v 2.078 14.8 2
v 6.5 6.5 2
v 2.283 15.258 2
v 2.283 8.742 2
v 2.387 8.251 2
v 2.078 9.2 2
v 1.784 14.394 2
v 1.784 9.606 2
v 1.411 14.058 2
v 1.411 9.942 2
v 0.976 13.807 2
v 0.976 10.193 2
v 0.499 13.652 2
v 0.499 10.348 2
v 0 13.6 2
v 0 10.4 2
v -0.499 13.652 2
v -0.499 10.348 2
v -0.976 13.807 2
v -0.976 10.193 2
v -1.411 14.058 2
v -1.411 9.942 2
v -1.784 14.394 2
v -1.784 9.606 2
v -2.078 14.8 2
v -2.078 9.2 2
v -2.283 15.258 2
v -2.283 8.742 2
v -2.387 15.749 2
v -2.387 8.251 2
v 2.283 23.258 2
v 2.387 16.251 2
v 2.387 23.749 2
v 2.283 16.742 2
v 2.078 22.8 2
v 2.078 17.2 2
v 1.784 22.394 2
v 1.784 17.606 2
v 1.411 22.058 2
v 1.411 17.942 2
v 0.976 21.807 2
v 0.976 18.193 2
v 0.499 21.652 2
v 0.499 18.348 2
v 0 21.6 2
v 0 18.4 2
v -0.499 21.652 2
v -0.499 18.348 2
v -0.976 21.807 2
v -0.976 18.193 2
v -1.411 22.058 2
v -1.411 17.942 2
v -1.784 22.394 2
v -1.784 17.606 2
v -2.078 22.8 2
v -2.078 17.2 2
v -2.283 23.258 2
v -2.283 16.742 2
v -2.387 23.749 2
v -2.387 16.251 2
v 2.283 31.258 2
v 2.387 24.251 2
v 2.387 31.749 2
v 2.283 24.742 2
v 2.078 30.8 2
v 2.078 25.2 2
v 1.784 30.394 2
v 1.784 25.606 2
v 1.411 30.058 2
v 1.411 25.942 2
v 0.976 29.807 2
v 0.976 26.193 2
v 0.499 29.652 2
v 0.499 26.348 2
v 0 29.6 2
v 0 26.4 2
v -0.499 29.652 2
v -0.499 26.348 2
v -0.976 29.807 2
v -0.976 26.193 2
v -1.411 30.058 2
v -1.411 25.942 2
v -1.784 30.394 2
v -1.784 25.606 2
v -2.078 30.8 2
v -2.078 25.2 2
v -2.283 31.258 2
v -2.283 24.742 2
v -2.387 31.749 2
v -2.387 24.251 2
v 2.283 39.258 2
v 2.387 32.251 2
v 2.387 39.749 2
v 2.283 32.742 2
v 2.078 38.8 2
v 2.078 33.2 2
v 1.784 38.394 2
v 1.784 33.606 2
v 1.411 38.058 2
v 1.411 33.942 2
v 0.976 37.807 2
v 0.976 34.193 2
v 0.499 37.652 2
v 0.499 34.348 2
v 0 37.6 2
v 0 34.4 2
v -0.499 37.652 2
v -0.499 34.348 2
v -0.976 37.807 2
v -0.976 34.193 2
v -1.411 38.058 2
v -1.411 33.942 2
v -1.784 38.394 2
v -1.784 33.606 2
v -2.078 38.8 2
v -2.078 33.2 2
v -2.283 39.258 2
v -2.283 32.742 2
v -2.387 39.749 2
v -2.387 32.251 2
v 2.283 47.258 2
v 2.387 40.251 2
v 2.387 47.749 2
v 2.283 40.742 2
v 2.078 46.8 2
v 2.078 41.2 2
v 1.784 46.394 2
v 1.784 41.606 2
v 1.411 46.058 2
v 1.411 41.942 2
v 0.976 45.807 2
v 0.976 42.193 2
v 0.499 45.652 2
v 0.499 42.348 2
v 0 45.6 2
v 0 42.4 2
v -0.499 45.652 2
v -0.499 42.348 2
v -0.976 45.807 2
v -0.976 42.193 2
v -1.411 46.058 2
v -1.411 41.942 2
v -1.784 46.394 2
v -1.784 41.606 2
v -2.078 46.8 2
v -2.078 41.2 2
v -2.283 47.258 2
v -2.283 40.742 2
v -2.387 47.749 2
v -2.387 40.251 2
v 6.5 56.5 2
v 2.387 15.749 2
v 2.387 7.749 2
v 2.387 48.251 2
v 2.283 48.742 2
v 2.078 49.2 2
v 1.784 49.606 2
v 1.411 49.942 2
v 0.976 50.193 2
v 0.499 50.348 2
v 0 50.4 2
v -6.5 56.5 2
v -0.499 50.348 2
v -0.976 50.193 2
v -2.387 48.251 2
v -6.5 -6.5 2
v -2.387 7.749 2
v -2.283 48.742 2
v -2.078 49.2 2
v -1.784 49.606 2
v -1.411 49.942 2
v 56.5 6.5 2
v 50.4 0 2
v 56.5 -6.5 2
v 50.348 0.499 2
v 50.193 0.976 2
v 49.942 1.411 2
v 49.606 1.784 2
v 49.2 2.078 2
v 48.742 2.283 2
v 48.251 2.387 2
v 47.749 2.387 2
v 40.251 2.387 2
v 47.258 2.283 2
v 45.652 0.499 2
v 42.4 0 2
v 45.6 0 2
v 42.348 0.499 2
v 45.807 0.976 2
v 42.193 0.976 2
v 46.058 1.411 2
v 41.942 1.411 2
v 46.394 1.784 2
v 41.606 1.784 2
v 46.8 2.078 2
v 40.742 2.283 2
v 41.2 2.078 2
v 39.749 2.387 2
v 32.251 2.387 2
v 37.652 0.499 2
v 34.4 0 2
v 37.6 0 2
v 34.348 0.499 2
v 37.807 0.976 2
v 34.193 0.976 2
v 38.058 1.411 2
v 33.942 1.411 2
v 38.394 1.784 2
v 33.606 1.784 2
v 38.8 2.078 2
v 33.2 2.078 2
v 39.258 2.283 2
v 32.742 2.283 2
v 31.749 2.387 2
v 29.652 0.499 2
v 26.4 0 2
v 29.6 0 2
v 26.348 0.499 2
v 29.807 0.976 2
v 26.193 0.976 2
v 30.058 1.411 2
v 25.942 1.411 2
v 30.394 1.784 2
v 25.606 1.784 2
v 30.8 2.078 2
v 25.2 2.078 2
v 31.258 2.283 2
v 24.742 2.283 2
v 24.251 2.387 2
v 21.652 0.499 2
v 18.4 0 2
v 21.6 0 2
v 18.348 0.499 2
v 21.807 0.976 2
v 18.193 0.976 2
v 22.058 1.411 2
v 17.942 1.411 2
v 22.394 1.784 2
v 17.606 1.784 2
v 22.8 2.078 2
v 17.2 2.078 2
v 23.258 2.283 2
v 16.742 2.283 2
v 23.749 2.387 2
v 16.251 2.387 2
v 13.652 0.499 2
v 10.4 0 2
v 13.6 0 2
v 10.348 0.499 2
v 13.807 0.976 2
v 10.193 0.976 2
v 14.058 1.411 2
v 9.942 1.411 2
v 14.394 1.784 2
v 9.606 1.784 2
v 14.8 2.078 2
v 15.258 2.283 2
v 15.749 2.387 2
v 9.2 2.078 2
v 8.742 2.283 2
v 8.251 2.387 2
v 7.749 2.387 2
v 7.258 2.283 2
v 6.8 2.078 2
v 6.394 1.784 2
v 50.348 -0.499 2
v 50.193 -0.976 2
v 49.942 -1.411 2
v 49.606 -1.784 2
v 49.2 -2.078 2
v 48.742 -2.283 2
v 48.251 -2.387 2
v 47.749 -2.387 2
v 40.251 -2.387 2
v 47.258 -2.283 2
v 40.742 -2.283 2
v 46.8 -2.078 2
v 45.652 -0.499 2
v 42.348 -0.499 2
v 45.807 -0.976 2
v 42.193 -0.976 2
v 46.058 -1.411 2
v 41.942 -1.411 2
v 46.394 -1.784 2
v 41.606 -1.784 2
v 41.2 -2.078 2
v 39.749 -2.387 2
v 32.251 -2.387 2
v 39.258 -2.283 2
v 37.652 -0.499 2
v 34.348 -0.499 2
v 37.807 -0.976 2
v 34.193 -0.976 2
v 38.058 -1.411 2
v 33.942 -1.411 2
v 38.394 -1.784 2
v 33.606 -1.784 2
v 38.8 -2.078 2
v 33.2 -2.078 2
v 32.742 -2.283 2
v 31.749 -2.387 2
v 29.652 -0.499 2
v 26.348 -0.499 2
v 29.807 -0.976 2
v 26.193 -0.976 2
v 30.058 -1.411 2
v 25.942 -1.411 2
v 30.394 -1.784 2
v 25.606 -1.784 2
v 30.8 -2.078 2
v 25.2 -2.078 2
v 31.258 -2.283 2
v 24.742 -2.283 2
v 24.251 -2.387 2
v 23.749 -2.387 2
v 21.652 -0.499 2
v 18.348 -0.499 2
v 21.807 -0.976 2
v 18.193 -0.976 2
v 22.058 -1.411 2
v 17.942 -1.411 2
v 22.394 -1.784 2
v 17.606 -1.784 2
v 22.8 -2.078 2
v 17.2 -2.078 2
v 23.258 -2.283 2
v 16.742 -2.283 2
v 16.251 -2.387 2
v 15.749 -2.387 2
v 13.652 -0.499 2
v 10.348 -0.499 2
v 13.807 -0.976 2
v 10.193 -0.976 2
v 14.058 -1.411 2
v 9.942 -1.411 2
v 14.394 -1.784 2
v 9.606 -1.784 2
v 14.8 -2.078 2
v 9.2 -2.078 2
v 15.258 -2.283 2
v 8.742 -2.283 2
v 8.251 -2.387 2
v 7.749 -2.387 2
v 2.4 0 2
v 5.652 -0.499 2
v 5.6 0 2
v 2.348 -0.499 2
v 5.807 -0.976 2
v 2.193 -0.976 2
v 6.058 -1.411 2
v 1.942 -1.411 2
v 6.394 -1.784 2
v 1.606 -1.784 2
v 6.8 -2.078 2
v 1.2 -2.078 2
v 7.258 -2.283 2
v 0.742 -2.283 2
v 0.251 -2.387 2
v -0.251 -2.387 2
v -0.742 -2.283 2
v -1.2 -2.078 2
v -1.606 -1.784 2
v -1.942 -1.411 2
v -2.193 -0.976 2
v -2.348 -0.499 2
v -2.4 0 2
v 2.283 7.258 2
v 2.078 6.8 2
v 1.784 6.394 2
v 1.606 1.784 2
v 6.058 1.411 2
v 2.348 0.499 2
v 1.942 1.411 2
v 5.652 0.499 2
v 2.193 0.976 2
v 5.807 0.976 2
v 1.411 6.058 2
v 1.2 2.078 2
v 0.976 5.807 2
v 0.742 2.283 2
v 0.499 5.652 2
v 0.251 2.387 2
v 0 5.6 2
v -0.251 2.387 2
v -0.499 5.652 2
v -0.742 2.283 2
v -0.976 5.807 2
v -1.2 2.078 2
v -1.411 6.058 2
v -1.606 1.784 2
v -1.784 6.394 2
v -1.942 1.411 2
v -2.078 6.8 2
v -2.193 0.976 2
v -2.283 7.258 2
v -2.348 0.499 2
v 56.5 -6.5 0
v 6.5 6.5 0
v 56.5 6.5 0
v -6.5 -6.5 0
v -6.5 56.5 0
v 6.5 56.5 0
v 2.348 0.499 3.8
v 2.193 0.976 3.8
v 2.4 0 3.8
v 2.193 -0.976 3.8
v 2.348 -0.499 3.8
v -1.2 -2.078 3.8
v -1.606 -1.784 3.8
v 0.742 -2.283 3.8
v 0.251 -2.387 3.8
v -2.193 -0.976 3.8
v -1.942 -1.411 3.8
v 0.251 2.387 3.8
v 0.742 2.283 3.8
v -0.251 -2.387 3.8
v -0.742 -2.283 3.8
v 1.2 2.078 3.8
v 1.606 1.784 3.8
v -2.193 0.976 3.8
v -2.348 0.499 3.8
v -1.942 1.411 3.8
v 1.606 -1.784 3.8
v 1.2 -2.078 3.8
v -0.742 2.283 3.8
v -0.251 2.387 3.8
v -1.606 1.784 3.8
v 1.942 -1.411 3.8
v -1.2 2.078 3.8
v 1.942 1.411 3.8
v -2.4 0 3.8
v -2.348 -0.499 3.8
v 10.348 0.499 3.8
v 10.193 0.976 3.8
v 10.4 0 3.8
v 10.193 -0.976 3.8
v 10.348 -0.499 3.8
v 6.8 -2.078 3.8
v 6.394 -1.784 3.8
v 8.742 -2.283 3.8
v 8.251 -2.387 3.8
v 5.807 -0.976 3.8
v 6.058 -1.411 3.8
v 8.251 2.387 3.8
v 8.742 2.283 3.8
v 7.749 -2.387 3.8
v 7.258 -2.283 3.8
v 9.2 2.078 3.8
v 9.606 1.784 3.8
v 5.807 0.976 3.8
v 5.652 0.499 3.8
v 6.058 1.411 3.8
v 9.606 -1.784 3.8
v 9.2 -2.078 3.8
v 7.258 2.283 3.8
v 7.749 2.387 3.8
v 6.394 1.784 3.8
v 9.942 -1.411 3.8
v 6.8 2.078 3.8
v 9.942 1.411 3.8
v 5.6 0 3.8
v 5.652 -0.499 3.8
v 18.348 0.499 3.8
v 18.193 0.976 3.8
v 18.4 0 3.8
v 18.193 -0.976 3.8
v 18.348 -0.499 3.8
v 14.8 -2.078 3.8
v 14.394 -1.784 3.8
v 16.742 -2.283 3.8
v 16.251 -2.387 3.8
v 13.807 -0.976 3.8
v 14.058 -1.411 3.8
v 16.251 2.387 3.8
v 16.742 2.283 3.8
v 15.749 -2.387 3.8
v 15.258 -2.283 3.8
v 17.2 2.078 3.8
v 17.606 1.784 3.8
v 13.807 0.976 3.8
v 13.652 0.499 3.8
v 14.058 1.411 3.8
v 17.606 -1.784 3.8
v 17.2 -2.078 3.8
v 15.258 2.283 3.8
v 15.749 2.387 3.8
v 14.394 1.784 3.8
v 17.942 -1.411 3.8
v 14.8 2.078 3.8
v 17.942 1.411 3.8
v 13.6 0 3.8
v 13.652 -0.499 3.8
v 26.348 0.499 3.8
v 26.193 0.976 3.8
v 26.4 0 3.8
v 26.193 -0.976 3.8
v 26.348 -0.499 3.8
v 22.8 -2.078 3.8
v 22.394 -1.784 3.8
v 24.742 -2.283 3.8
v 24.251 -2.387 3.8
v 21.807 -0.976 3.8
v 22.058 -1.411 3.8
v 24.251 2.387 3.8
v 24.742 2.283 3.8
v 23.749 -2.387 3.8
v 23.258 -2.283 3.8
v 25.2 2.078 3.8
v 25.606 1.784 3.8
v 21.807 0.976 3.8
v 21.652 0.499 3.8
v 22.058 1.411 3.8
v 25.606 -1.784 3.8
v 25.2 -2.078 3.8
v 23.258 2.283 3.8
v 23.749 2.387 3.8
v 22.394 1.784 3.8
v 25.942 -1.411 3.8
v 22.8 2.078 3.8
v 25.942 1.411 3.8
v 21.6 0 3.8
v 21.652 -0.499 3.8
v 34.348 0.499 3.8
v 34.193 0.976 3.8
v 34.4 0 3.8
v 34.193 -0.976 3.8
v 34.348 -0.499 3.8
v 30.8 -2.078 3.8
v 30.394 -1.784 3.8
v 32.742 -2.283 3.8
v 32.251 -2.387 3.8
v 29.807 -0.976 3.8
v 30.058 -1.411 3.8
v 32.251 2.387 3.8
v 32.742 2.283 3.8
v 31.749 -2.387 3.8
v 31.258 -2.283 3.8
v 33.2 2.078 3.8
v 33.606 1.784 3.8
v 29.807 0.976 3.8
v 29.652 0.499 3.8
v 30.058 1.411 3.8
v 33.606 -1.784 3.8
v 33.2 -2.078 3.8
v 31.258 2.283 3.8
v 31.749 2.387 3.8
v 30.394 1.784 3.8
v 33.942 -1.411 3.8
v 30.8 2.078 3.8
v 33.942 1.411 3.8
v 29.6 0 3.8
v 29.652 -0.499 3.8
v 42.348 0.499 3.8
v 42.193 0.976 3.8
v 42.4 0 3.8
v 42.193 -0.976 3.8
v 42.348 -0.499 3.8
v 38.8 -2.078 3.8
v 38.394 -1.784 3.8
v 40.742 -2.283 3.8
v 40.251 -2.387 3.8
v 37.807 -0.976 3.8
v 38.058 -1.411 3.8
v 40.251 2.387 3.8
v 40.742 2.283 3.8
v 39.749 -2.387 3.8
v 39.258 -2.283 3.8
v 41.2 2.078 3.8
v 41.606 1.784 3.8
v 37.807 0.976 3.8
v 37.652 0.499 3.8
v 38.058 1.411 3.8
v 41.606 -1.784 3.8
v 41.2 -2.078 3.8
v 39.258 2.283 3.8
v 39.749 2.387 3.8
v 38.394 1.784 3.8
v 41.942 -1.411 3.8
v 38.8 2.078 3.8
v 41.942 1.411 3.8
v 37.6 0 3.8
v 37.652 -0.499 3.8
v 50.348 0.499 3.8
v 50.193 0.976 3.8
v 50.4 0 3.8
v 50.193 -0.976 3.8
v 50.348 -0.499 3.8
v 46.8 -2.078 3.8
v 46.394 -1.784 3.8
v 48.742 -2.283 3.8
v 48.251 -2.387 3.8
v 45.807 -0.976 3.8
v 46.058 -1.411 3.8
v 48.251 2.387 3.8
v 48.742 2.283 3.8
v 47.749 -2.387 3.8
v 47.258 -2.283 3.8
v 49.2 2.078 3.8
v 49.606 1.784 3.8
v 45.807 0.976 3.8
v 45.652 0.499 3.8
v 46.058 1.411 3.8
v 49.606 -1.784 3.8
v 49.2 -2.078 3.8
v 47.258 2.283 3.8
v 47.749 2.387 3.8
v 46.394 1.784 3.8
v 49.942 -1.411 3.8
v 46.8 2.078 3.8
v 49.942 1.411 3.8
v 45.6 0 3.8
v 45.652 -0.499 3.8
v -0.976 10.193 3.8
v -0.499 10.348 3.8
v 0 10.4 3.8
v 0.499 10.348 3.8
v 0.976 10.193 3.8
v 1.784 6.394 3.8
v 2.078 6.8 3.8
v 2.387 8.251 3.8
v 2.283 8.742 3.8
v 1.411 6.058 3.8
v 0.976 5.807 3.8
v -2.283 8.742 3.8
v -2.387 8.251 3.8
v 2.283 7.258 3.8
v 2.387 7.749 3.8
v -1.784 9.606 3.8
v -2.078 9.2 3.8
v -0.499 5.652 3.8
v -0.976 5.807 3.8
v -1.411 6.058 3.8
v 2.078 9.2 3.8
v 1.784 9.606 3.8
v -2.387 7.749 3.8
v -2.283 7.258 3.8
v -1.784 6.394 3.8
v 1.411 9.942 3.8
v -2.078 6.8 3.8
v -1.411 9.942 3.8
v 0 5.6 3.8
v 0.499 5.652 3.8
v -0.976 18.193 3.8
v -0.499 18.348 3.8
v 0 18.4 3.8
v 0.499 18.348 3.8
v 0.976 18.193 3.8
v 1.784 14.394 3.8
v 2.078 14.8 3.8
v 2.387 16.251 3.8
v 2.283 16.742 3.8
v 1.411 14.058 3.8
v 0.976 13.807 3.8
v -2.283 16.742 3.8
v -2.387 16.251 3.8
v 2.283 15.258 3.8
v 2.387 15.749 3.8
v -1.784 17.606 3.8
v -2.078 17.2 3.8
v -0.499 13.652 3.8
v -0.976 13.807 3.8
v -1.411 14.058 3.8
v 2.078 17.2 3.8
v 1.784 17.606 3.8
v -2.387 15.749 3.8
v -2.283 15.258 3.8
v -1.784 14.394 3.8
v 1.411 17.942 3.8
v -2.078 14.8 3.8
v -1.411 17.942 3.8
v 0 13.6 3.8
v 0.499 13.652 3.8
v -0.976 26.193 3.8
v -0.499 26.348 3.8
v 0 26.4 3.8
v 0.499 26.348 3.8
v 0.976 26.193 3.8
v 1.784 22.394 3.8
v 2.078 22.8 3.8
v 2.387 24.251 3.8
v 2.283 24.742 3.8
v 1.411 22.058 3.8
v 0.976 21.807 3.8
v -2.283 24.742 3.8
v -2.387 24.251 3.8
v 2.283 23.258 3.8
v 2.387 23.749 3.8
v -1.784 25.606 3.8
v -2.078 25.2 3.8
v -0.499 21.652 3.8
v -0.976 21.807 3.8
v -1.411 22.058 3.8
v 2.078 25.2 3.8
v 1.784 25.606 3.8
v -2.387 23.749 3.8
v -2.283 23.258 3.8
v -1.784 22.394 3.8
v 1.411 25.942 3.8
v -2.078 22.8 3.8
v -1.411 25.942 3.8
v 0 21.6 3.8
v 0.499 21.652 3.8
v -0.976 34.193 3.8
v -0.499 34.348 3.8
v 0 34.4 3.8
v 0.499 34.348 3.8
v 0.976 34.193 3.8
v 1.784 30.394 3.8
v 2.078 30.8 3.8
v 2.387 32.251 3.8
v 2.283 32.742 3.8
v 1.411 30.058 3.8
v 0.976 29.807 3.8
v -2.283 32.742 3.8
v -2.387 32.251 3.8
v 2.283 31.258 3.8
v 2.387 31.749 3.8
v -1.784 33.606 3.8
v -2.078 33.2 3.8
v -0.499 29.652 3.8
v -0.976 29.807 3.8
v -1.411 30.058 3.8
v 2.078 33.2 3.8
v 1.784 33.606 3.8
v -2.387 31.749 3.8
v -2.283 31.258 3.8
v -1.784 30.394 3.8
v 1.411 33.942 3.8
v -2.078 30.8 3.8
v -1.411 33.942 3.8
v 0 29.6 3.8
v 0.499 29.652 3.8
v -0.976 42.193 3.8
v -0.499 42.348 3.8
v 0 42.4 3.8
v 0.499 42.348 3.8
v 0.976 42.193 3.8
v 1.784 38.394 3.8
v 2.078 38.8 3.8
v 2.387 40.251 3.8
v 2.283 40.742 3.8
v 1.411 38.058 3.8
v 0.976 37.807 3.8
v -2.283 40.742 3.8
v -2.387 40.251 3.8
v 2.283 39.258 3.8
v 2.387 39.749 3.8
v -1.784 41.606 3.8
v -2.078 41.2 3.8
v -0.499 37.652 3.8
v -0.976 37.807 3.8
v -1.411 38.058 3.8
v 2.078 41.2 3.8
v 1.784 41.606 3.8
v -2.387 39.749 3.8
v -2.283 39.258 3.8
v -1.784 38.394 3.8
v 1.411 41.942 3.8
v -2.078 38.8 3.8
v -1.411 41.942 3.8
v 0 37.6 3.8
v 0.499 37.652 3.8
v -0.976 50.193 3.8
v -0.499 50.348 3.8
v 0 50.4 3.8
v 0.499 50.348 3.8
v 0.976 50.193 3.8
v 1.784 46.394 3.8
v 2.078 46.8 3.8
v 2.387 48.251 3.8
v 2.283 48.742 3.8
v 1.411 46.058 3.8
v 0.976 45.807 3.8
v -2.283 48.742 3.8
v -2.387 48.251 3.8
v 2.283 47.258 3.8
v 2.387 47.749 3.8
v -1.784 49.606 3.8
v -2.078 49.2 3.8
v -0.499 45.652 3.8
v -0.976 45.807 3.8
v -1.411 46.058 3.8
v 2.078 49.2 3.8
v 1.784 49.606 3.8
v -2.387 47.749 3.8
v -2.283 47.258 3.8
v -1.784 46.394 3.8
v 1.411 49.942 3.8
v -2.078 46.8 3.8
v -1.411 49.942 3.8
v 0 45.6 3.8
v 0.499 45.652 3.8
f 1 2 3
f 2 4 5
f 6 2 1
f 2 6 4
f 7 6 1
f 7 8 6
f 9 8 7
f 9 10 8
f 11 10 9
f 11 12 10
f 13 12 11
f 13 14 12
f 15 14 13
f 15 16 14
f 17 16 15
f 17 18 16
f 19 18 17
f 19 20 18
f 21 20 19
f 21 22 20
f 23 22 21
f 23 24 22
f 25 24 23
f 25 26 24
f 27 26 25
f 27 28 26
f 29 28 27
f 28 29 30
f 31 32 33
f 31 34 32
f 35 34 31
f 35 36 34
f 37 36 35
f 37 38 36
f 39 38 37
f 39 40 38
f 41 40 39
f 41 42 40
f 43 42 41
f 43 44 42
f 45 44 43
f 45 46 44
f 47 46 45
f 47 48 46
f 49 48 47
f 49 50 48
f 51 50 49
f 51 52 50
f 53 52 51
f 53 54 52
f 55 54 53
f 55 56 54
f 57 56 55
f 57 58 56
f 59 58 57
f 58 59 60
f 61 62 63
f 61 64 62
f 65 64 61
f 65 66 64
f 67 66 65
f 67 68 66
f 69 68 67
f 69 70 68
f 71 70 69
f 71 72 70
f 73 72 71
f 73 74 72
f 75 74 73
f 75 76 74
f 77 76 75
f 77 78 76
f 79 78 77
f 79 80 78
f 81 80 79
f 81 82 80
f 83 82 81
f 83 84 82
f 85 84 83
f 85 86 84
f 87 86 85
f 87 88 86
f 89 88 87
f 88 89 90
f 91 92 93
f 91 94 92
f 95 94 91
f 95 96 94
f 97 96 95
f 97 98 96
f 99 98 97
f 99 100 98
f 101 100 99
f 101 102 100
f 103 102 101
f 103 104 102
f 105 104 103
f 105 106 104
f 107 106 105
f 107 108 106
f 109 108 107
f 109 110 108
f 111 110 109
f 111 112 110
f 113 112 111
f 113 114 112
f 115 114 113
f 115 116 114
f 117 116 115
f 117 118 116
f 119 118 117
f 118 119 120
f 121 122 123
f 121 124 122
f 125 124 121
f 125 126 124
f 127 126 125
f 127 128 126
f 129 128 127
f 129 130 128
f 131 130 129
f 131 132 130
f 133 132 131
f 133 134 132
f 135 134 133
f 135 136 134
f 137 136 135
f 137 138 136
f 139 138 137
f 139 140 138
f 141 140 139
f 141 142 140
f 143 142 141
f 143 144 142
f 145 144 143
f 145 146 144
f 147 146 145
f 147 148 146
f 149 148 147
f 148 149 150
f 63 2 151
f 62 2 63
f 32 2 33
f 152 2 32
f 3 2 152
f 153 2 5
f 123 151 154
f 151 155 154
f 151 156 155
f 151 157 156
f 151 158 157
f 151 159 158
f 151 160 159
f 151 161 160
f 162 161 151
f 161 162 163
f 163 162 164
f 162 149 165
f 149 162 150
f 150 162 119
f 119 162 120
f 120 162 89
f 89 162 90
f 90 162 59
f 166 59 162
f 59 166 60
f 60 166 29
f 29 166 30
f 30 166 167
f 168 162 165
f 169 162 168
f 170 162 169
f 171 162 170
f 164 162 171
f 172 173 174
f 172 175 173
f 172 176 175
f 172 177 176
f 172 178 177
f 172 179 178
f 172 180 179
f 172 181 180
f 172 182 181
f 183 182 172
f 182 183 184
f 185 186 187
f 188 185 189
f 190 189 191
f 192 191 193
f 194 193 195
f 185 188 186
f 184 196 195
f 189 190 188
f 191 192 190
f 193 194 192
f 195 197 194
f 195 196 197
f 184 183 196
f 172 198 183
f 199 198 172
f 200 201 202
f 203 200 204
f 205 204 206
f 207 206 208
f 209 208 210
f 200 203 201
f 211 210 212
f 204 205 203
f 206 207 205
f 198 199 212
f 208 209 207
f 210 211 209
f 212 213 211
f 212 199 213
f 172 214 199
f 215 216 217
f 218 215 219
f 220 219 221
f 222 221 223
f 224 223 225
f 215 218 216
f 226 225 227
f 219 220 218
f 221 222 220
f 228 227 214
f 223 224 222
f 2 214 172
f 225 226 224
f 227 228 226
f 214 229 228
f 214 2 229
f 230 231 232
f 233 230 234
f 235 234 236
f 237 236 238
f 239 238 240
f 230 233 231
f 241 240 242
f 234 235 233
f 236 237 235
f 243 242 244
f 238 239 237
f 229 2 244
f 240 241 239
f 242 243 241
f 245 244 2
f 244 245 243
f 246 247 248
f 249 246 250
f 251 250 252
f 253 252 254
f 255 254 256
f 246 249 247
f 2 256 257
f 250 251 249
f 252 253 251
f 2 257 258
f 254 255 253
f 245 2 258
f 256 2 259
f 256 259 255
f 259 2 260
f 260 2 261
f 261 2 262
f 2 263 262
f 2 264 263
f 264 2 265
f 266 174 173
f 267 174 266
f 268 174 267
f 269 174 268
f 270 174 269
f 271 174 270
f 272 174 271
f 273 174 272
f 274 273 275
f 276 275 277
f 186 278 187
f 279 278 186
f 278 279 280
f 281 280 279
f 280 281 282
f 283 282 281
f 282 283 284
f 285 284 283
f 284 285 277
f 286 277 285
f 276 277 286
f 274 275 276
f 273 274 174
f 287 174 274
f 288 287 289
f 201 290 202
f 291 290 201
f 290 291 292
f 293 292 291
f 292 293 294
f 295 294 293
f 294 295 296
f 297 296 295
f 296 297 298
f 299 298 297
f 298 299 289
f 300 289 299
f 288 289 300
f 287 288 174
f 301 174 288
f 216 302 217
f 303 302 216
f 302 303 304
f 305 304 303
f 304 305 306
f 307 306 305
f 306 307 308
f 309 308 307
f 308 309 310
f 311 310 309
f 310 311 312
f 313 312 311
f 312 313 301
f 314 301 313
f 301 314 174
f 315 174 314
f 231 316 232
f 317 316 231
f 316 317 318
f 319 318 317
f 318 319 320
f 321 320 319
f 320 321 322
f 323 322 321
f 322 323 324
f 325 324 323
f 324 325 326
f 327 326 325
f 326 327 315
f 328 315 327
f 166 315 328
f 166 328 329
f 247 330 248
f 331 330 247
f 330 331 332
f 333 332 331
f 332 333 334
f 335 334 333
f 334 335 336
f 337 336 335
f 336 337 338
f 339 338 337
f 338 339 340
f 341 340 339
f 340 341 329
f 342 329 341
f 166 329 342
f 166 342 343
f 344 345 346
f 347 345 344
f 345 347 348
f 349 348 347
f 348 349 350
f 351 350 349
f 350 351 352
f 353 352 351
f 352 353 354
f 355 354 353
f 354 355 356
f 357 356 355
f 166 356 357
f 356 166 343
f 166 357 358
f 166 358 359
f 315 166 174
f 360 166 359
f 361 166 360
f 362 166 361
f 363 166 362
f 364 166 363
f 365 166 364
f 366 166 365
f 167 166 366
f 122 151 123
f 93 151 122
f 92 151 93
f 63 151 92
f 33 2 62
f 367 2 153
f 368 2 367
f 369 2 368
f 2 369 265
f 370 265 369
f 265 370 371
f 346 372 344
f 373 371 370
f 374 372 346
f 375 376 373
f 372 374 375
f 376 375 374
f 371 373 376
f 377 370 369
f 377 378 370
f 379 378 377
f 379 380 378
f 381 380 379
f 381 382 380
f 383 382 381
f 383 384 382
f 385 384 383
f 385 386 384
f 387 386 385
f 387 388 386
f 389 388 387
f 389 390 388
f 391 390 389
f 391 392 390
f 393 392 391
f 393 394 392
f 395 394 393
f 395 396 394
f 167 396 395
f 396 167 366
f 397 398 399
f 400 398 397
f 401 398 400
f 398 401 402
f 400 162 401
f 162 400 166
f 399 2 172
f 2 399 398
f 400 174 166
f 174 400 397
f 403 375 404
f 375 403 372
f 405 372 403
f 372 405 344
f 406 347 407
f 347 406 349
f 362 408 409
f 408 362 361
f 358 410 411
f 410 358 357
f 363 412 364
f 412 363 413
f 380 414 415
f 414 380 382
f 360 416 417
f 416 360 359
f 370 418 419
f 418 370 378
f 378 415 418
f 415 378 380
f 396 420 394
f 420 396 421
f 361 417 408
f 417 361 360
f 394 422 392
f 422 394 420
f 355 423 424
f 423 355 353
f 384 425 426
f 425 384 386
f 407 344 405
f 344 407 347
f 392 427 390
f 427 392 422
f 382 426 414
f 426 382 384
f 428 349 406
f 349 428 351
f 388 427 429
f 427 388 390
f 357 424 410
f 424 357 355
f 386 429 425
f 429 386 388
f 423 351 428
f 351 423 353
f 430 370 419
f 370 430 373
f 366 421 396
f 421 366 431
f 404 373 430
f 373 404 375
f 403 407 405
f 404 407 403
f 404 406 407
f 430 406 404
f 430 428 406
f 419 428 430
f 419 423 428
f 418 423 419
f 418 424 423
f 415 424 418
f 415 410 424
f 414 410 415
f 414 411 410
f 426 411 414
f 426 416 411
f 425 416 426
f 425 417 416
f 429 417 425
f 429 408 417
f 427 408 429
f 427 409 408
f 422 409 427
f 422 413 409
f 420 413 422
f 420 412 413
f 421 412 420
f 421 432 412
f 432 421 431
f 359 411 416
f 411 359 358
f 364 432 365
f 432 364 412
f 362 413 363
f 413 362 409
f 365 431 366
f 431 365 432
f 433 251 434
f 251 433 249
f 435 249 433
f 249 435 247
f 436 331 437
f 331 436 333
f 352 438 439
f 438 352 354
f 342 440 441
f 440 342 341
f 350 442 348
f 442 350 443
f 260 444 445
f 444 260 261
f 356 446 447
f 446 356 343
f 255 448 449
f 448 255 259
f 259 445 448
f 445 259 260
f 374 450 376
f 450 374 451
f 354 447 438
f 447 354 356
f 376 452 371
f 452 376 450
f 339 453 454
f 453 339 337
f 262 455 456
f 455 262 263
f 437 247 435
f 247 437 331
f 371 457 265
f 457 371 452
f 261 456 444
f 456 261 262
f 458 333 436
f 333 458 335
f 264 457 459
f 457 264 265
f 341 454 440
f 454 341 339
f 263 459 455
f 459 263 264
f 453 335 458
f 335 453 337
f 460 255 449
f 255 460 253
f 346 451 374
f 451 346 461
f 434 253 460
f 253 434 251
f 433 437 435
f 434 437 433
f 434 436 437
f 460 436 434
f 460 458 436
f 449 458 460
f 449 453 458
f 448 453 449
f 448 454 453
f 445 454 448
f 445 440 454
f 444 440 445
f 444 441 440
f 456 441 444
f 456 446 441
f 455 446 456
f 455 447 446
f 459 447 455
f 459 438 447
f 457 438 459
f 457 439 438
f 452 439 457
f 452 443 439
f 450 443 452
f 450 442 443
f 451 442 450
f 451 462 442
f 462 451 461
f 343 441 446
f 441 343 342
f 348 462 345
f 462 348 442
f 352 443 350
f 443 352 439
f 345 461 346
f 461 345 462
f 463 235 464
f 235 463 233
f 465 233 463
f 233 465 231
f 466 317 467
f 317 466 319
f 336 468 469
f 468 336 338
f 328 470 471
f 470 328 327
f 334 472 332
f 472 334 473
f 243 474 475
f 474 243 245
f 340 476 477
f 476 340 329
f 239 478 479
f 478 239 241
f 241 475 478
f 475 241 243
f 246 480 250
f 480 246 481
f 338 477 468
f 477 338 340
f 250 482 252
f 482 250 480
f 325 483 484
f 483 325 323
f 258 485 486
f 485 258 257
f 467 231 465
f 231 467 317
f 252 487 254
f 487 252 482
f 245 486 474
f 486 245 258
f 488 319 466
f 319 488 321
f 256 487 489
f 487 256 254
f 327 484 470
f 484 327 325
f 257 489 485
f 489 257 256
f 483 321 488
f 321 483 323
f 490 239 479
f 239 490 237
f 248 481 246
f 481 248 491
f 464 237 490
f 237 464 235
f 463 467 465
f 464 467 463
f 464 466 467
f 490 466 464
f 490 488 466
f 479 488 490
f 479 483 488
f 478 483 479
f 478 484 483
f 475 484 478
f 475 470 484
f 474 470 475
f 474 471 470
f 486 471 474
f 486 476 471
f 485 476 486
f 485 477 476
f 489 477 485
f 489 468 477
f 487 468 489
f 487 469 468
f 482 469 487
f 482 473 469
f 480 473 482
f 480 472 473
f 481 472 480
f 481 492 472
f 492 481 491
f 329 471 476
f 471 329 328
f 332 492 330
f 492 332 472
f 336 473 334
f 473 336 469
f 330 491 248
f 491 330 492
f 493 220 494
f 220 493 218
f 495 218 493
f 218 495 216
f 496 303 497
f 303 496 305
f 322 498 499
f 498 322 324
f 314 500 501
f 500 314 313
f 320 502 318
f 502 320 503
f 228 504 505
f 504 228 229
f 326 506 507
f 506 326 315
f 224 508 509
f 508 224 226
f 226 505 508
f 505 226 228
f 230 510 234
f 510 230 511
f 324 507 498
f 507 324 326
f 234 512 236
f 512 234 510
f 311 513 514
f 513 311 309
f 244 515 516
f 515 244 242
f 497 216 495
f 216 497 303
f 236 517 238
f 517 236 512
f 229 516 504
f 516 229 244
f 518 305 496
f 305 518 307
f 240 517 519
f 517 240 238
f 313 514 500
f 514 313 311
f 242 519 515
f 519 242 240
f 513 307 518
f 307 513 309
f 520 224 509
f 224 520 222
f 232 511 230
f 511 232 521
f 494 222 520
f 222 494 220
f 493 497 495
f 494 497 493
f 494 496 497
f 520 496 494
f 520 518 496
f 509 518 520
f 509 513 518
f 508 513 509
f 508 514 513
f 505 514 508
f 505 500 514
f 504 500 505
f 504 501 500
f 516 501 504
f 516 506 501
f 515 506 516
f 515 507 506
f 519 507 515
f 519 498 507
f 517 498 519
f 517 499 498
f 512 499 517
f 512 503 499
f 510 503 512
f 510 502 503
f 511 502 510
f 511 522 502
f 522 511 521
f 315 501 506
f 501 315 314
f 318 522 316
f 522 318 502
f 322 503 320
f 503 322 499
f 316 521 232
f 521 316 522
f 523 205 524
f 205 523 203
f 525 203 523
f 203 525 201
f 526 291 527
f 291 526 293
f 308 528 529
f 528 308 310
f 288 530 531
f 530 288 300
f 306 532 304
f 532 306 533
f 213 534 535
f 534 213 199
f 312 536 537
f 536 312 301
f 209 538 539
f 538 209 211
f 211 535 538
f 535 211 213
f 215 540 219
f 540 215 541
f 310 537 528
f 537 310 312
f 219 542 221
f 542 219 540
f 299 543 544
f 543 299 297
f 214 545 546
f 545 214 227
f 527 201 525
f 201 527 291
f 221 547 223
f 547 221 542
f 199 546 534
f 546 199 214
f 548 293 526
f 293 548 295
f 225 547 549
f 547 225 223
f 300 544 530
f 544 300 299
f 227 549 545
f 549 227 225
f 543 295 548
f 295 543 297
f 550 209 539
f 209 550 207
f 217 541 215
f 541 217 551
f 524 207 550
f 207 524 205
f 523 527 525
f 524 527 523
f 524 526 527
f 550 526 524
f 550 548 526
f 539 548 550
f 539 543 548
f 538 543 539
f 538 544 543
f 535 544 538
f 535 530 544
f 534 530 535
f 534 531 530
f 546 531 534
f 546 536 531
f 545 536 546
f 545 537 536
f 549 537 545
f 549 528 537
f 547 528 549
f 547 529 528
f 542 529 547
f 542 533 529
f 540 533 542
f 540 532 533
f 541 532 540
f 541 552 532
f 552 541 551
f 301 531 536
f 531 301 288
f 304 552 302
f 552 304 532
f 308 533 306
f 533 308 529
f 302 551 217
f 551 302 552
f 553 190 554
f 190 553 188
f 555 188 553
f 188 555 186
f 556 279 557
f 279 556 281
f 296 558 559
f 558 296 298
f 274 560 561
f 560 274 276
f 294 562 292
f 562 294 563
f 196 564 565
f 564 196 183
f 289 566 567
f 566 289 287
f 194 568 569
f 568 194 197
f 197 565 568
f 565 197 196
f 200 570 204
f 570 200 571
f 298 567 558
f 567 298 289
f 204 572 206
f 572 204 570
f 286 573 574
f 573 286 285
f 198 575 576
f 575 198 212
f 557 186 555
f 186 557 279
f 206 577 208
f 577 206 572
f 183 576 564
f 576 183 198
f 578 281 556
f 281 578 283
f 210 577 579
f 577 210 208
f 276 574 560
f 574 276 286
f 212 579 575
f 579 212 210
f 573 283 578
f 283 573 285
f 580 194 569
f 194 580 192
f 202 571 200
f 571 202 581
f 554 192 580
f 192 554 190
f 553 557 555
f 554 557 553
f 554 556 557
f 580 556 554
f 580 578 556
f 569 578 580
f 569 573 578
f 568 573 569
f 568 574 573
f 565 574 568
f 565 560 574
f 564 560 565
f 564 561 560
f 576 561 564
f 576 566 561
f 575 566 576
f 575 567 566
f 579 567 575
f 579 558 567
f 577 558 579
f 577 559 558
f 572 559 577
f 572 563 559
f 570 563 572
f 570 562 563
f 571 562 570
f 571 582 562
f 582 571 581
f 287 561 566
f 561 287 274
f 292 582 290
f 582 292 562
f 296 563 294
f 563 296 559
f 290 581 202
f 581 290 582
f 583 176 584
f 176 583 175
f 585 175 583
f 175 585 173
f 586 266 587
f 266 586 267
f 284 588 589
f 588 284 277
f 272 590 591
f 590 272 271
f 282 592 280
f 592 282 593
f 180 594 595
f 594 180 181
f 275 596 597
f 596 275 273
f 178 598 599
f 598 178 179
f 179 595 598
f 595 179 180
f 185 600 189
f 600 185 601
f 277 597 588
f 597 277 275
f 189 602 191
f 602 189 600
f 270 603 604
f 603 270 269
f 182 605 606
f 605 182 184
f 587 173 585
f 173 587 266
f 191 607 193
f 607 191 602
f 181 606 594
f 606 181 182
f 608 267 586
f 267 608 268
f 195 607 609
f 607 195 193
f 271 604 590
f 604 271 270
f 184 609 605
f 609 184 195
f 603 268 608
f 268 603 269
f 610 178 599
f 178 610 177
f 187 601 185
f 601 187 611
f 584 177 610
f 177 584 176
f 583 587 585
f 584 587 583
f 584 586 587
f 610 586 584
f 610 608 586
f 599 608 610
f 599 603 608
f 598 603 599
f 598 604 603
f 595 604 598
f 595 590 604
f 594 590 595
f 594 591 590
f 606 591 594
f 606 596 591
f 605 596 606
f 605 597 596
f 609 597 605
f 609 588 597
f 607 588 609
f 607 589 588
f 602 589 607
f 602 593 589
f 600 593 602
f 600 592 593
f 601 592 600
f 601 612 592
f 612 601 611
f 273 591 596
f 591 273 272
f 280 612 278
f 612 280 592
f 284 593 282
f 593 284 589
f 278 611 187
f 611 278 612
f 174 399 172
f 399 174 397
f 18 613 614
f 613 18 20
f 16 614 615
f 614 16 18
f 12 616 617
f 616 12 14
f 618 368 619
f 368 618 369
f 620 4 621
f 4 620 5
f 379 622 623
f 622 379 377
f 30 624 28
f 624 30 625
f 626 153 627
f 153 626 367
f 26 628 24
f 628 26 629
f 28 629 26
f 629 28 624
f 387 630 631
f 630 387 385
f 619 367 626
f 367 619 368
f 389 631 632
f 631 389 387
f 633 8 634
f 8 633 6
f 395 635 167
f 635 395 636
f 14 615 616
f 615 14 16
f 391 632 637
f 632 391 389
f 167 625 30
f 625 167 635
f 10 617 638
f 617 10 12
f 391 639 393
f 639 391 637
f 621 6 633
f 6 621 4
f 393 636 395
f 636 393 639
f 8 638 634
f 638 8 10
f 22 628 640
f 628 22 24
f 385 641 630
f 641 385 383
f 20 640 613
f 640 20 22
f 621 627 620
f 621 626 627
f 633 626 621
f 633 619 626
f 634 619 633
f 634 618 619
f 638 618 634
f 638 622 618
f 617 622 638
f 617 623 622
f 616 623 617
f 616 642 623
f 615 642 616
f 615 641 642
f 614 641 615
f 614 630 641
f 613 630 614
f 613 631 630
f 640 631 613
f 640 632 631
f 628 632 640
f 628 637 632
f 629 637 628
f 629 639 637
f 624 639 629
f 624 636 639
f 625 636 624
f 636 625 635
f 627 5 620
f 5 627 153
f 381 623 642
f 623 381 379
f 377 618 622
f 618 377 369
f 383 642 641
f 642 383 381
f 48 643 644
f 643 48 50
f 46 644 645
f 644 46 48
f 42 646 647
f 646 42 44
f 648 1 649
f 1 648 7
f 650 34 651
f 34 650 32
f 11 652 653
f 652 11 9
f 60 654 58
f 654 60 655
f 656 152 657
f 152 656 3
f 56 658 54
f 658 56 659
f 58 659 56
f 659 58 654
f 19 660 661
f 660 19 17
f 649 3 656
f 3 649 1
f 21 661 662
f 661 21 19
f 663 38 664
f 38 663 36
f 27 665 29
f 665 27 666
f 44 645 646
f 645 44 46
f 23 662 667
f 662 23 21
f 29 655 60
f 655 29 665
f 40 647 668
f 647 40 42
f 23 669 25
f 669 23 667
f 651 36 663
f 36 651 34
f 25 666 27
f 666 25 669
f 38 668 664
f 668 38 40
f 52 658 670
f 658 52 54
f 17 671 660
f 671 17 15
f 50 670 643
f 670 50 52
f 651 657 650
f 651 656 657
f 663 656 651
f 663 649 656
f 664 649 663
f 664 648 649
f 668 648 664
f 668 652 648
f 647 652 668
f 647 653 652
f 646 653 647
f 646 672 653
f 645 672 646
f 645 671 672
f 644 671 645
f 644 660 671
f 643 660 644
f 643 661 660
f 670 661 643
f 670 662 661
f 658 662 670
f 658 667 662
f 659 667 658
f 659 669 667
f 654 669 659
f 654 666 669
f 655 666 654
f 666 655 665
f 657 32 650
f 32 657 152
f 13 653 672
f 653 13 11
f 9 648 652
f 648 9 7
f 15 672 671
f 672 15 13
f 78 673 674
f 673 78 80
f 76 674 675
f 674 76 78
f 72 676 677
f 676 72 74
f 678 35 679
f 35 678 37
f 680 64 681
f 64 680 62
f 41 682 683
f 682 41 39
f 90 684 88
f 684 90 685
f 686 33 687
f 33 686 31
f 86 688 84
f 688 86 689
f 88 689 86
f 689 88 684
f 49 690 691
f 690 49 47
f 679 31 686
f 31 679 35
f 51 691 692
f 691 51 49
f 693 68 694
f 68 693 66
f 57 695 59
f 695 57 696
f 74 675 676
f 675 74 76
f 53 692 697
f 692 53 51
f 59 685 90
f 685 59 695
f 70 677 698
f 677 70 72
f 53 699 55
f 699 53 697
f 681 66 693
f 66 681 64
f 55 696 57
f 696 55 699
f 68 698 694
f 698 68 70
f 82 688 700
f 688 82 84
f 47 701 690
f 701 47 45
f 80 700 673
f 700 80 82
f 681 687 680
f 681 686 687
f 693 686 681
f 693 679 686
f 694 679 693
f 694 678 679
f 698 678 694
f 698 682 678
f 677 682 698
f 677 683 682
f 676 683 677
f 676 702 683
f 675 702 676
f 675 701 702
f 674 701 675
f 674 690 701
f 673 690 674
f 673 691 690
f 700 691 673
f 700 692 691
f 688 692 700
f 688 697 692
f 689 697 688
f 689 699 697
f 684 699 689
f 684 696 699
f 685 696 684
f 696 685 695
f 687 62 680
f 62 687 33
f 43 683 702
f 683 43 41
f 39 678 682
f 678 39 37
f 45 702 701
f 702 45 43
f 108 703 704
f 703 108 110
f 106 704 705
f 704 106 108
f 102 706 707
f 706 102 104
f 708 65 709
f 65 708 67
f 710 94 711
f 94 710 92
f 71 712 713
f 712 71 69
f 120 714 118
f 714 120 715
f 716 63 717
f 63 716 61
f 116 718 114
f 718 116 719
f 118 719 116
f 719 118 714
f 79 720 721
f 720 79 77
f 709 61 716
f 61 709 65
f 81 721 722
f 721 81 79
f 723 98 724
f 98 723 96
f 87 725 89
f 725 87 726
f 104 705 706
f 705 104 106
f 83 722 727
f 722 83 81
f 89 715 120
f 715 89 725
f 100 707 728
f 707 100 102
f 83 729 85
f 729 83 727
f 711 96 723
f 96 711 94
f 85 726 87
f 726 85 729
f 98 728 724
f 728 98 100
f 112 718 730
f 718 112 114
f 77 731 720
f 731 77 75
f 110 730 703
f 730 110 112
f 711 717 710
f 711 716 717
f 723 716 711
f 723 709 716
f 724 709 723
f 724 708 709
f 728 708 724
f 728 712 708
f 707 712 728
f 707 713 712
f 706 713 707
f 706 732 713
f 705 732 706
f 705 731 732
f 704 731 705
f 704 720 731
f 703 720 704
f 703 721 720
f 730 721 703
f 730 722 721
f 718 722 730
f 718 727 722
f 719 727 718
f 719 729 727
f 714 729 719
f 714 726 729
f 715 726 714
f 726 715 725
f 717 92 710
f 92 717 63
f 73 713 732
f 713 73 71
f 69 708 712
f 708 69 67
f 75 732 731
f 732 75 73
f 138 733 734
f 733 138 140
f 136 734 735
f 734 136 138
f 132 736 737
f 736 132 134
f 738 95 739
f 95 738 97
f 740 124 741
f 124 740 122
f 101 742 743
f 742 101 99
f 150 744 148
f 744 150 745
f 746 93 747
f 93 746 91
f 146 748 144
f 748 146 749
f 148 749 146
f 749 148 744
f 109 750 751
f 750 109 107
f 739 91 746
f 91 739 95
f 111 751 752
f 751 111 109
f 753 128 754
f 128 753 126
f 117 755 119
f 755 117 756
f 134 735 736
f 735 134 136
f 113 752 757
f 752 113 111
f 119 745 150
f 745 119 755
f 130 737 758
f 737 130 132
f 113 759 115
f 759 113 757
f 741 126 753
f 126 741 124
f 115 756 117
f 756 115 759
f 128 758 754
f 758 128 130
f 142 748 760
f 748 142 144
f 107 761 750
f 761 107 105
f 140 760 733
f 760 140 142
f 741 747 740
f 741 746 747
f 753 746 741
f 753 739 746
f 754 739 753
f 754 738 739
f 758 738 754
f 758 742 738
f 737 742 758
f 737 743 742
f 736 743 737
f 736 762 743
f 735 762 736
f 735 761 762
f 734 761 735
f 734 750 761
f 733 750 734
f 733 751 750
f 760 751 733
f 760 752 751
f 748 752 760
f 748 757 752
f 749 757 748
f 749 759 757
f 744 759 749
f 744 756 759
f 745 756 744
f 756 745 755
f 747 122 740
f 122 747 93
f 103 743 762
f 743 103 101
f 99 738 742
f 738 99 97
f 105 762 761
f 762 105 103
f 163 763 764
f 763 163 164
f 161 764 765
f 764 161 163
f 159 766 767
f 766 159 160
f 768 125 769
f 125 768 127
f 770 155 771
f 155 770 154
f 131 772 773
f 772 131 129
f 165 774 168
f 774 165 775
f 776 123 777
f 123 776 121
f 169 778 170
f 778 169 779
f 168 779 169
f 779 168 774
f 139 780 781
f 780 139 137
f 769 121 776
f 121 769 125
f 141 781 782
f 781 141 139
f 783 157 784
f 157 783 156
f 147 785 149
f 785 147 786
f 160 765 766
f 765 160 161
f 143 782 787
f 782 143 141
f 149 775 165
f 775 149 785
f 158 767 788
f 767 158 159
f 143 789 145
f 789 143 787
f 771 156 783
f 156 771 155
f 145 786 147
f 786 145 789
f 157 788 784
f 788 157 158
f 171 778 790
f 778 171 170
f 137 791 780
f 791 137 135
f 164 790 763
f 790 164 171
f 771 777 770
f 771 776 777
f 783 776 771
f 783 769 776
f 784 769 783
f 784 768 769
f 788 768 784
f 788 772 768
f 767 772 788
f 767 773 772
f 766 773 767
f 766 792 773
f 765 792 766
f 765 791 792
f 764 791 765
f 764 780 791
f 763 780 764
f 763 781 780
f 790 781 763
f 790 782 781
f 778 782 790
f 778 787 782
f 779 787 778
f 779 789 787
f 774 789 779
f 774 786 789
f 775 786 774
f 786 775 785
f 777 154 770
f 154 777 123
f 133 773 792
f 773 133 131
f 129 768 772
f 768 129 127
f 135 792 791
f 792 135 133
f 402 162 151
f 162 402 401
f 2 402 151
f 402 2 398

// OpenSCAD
// file: common.scad
CENTER_SIZE = 9;
SLEEVE_REACH = 56.5;
GROOVE_WIDTH = 9;
WALL_HEIGHT = 10;
WALL_THICKNESS = 2;
BASE_THICKNESS = 2;
TOTAL_WIDTH = GROOVE_WIDTH + 2 * WALL_THICKNESS;
SLEEVE_LENGTH = SLEEVE_REACH - CENTER_SIZE/2;
DOWEL_DIAMETER = 4.5;
DOWEL_DEPTH = 3;
CARDBOARD_THICKNESS = 2;
GROOVE_BOTTOM = CARDBOARD_THICKNESS;
CURVE_POWER = 2;
CURVE_POINTS = 20;
TILT_ANGLE_EXTRA = 5;
FLEXIBLE_WALL_HEIGHT = WALL_HEIGHT * 2;
LEGO_STUD_DIAMETER = 4.8;
LEGO_STUD_HEIGHT = 1.8;
LEGO_UNIT = 8;

LEFT = 3;
RIGHT = 1;

function wall_curve(z) =
    GROOVE_BOTTOM/2 + (GROOVE_WIDTH/2 - GROOVE_BOTTOM/2) * pow(z/(FLEXIBLE_WALL_HEIGHT - BASE_THICKNESS), CURVE_POWER);

module curved_wall_profile(side) {
    wall_h = FLEXIBLE_WALL_HEIGHT - BASE_THICKNESS;
    points_inner = [for (i = [0:CURVE_POINTS])
        [wall_curve(i * wall_h / CURVE_POINTS) * side,
         i * wall_h / CURVE_POINTS]
    ];
    points_outer = [for (i = [0:CURVE_POINTS])
        [(wall_curve(i * wall_h / CURVE_POINTS) + WALL_THICKNESS) * side,
         i * wall_h / CURVE_POINTS]
    ];
    all_points = concat(
        [[points_inner[0][0], 0]],
        points_inner,
        [points_outer[len(points_outer)-1]],
        [for (i = [len(points_outer)-1:-1:0]) points_outer[i]],
        [[points_outer[0][0], 0]]
    );
    polygon(all_points);
}

module draw_regular_wall_base(width) {
    translate([0, 0, BASE_THICKNESS])
        cube([width, WALL_THICKNESS, WALL_HEIGHT - BASE_THICKNESS]);
}

module draw_flexible_wall_base(width) {
    tilt_angle = atan((GROOVE_WIDTH/2 - GROOVE_BOTTOM/2) / (FLEXIBLE_WALL_HEIGHT - BASE_THICKNESS)) + TILT_ANGLE_EXTRA;
    translate([0, -WALL_THICKNESS/2, 0])
        rotate([tilt_angle + 6, 0, 0])
            rotate([90, 0, 90])
                linear_extrude(height = width)
                    curved_wall_profile(1);
}

module draw_center_base(with_dowel = false) {
    union() {
        translate([-TOTAL_WIDTH/2, -TOTAL_WIDTH/2, 0])
            cube([TOTAL_WIDTH, TOTAL_WIDTH, BASE_THICKNESS]);
        if (with_dowel) {
            translate([0, 0, -DOWEL_DEPTH])
                cylinder(h=DOWEL_DEPTH, d=DOWEL_DIAMETER, $fn=30);
        }
    }
}

module orient_wall(side) {
    if (side == 0) {
        rotate([0, 0, 270])
            children();
    } else if (side == 1) {
        children();
    } else if (side == 2) {
        rotate([0, 0, 90])
            children();
    } else if (side == 3) {
        rotate([0, 0, 180])
            children();
    }
}

module translate_center_wall(side) {
    if (side == 0) {
        translate([CENTER_SIZE/2, TOTAL_WIDTH/2, 0])
            children();
    } else if (side == 1) {
        translate([-TOTAL_WIDTH/2, CENTER_SIZE/2, 0])
            children();
    } else if (side == 2) {
        translate([-CENTER_SIZE/2, -TOTAL_WIDTH/2, 0])
            children();
    } else if (side == 3) {
        translate([TOTAL_WIDTH/2, -CENTER_SIZE/2, 0])
            children();
    }
}

module position_center_wall(side) {
    translate_center_wall(side) {
        orient_wall(side) {
            children();
        }
    }
}

module place_center_wall(side, wall_type = "regular") {
    position_center_wall(side) {
        if (wall_type == "regular") {
            draw_regular_wall_base(TOTAL_WIDTH);
        } else {
            draw_flexible_wall_base(TOTAL_WIDTH);
        }
    }
}

module draw_sleeve_base(with_dowel = false) {
    union() {
        translate([0, -TOTAL_WIDTH/2, 0])
            cube([SLEEVE_LENGTH, TOTAL_WIDTH, BASE_THICKNESS]);
        if (with_dowel) {
            translate([25 - CENTER_SIZE/2, 0, -DOWEL_DEPTH])
                cylinder(h=DOWEL_DEPTH, d=DOWEL_DIAMETER, $fn=30);
            translate([50 - CENTER_SIZE/2, 0, -DOWEL_DEPTH])
                cylinder(h=DOWEL_DEPTH, d=DOWEL_DIAMETER, $fn=30);
        }
    }
}

module translate_sleeve_wall(side) {
    if (side == LEFT) {
        translate([SLEEVE_LENGTH, -TOTAL_WIDTH/2 + WALL_THICKNESS, 0])
            children();
    } else if (side == RIGHT) {
        translate([0, TOTAL_WIDTH/2 - WALL_THICKNESS, 0])
            children();
    }
}

module position_sleeve_wall(side) {
    translate_sleeve_wall(side) {
        orient_wall(side) {
            children();
        }
    }
}

module draw_sleeve_wall(side, wall_type = "regular") {
    position_sleeve_wall(side) {
        if (wall_type == "regular") {
            draw_regular_wall_base(SLEEVE_LENGTH);
        } else {
            draw_flexible_wall_base(SLEEVE_LENGTH);
        }
    }
}

module draw_full_sleeve(with_dowel = false, wall_type = "regular") {
    union() {
        draw_sleeve_base(with_dowel);
        draw_sleeve_wall(LEFT, wall_type);
        draw_sleeve_wall(RIGHT, wall_type);
    }
}

module place_sleeve(side, with_dowel = false, wall_type = "regular") {
    if (side == 0) {
        translate([CENTER_SIZE/2, 0, 0])
            draw_full_sleeve(with_dowel, wall_type);
    } else if (side == 1) {
        rotate([0, 0, 90])
            translate([CENTER_SIZE/2, 0, 0])
                draw_full_sleeve(with_dowel, wall_type);
    } else if (side == 2) {
        rotate([0, 0, 180])
            translate([CENTER_SIZE/2, 0, 0])
                draw_full_sleeve(with_dowel, wall_type);
    } else if (side == 3) {
        rotate([0, 0, 270])
            translate([CENTER_SIZE/2, 0, 0])
                draw_full_sleeve(with_dowel, wall_type);
    }
}

module add_dowel(x, y, dowel_diameter, dowel_depth) {
    translate([x, y, -dowel_depth])
        cylinder(h=dowel_depth, d=dowel_diameter, $fn=30);
}

module draw_lego_stud() {
    cylinder(h=LEGO_STUD_HEIGHT, d=LEGO_STUD_DIAMETER, $fn=30);
}

module draw_center_with_studs(with_dowel = false) {
    union() {
        draw_center_base(with_dowel);
        translate([0, 0, BASE_THICKNESS])
            draw_lego_stud();
    }
}

module draw_sleeve_with_studs(with_dowel = false) {
    first_stud_candidate = LEGO_UNIT - (CENTER_SIZE/2 % LEGO_UNIT);
    first_stud = first_stud_candidate < LEGO_STUD_DIAMETER/2
                 ? first_stud_candidate + LEGO_UNIT
                 : first_stud_candidate;

    max_stud_position = SLEEVE_LENGTH - LEGO_STUD_DIAMETER/2;
    num_studs = floor((max_stud_position - first_stud) / LEGO_UNIT) + 1;

    union() {
        draw_sleeve_base(with_dowel);
        for (i = [0:num_studs-1]) {
            translate([first_stud + i * LEGO_UNIT, 0, BASE_THICKNESS])
                draw_lego_stud();
        }
    }
}

module place_sleeve_with_studs(side, with_dowel = false) {
    if (side == 0) {
        translate([CENTER_SIZE/2, 0, 0])
            draw_sleeve_with_studs(with_dowel);
    } else if (side == 1) {
        rotate([0, 0, 90])
            translate([CENTER_SIZE/2, 0, 0])
                draw_sleeve_with_studs(with_dowel);
    } else if (side == 2) {
        rotate([0, 0, 180])
            translate([CENTER_SIZE/2, 0, 0])
                draw_sleeve_with_studs(with_dowel);
    } else if (side == 3) {
        rotate([0, 0, 270])
            translate([CENTER_SIZE/2, 0, 0])
                draw_sleeve_with_studs(with_dowel);
    }
}
// main file
use <common.scad>

union() {
    draw_center_with_studs(with_dowel = false);
    place_sleeve_with_studs(0, with_dowel = false);
    place_sleeve_with_studs(1, with_dowel = false);
}
